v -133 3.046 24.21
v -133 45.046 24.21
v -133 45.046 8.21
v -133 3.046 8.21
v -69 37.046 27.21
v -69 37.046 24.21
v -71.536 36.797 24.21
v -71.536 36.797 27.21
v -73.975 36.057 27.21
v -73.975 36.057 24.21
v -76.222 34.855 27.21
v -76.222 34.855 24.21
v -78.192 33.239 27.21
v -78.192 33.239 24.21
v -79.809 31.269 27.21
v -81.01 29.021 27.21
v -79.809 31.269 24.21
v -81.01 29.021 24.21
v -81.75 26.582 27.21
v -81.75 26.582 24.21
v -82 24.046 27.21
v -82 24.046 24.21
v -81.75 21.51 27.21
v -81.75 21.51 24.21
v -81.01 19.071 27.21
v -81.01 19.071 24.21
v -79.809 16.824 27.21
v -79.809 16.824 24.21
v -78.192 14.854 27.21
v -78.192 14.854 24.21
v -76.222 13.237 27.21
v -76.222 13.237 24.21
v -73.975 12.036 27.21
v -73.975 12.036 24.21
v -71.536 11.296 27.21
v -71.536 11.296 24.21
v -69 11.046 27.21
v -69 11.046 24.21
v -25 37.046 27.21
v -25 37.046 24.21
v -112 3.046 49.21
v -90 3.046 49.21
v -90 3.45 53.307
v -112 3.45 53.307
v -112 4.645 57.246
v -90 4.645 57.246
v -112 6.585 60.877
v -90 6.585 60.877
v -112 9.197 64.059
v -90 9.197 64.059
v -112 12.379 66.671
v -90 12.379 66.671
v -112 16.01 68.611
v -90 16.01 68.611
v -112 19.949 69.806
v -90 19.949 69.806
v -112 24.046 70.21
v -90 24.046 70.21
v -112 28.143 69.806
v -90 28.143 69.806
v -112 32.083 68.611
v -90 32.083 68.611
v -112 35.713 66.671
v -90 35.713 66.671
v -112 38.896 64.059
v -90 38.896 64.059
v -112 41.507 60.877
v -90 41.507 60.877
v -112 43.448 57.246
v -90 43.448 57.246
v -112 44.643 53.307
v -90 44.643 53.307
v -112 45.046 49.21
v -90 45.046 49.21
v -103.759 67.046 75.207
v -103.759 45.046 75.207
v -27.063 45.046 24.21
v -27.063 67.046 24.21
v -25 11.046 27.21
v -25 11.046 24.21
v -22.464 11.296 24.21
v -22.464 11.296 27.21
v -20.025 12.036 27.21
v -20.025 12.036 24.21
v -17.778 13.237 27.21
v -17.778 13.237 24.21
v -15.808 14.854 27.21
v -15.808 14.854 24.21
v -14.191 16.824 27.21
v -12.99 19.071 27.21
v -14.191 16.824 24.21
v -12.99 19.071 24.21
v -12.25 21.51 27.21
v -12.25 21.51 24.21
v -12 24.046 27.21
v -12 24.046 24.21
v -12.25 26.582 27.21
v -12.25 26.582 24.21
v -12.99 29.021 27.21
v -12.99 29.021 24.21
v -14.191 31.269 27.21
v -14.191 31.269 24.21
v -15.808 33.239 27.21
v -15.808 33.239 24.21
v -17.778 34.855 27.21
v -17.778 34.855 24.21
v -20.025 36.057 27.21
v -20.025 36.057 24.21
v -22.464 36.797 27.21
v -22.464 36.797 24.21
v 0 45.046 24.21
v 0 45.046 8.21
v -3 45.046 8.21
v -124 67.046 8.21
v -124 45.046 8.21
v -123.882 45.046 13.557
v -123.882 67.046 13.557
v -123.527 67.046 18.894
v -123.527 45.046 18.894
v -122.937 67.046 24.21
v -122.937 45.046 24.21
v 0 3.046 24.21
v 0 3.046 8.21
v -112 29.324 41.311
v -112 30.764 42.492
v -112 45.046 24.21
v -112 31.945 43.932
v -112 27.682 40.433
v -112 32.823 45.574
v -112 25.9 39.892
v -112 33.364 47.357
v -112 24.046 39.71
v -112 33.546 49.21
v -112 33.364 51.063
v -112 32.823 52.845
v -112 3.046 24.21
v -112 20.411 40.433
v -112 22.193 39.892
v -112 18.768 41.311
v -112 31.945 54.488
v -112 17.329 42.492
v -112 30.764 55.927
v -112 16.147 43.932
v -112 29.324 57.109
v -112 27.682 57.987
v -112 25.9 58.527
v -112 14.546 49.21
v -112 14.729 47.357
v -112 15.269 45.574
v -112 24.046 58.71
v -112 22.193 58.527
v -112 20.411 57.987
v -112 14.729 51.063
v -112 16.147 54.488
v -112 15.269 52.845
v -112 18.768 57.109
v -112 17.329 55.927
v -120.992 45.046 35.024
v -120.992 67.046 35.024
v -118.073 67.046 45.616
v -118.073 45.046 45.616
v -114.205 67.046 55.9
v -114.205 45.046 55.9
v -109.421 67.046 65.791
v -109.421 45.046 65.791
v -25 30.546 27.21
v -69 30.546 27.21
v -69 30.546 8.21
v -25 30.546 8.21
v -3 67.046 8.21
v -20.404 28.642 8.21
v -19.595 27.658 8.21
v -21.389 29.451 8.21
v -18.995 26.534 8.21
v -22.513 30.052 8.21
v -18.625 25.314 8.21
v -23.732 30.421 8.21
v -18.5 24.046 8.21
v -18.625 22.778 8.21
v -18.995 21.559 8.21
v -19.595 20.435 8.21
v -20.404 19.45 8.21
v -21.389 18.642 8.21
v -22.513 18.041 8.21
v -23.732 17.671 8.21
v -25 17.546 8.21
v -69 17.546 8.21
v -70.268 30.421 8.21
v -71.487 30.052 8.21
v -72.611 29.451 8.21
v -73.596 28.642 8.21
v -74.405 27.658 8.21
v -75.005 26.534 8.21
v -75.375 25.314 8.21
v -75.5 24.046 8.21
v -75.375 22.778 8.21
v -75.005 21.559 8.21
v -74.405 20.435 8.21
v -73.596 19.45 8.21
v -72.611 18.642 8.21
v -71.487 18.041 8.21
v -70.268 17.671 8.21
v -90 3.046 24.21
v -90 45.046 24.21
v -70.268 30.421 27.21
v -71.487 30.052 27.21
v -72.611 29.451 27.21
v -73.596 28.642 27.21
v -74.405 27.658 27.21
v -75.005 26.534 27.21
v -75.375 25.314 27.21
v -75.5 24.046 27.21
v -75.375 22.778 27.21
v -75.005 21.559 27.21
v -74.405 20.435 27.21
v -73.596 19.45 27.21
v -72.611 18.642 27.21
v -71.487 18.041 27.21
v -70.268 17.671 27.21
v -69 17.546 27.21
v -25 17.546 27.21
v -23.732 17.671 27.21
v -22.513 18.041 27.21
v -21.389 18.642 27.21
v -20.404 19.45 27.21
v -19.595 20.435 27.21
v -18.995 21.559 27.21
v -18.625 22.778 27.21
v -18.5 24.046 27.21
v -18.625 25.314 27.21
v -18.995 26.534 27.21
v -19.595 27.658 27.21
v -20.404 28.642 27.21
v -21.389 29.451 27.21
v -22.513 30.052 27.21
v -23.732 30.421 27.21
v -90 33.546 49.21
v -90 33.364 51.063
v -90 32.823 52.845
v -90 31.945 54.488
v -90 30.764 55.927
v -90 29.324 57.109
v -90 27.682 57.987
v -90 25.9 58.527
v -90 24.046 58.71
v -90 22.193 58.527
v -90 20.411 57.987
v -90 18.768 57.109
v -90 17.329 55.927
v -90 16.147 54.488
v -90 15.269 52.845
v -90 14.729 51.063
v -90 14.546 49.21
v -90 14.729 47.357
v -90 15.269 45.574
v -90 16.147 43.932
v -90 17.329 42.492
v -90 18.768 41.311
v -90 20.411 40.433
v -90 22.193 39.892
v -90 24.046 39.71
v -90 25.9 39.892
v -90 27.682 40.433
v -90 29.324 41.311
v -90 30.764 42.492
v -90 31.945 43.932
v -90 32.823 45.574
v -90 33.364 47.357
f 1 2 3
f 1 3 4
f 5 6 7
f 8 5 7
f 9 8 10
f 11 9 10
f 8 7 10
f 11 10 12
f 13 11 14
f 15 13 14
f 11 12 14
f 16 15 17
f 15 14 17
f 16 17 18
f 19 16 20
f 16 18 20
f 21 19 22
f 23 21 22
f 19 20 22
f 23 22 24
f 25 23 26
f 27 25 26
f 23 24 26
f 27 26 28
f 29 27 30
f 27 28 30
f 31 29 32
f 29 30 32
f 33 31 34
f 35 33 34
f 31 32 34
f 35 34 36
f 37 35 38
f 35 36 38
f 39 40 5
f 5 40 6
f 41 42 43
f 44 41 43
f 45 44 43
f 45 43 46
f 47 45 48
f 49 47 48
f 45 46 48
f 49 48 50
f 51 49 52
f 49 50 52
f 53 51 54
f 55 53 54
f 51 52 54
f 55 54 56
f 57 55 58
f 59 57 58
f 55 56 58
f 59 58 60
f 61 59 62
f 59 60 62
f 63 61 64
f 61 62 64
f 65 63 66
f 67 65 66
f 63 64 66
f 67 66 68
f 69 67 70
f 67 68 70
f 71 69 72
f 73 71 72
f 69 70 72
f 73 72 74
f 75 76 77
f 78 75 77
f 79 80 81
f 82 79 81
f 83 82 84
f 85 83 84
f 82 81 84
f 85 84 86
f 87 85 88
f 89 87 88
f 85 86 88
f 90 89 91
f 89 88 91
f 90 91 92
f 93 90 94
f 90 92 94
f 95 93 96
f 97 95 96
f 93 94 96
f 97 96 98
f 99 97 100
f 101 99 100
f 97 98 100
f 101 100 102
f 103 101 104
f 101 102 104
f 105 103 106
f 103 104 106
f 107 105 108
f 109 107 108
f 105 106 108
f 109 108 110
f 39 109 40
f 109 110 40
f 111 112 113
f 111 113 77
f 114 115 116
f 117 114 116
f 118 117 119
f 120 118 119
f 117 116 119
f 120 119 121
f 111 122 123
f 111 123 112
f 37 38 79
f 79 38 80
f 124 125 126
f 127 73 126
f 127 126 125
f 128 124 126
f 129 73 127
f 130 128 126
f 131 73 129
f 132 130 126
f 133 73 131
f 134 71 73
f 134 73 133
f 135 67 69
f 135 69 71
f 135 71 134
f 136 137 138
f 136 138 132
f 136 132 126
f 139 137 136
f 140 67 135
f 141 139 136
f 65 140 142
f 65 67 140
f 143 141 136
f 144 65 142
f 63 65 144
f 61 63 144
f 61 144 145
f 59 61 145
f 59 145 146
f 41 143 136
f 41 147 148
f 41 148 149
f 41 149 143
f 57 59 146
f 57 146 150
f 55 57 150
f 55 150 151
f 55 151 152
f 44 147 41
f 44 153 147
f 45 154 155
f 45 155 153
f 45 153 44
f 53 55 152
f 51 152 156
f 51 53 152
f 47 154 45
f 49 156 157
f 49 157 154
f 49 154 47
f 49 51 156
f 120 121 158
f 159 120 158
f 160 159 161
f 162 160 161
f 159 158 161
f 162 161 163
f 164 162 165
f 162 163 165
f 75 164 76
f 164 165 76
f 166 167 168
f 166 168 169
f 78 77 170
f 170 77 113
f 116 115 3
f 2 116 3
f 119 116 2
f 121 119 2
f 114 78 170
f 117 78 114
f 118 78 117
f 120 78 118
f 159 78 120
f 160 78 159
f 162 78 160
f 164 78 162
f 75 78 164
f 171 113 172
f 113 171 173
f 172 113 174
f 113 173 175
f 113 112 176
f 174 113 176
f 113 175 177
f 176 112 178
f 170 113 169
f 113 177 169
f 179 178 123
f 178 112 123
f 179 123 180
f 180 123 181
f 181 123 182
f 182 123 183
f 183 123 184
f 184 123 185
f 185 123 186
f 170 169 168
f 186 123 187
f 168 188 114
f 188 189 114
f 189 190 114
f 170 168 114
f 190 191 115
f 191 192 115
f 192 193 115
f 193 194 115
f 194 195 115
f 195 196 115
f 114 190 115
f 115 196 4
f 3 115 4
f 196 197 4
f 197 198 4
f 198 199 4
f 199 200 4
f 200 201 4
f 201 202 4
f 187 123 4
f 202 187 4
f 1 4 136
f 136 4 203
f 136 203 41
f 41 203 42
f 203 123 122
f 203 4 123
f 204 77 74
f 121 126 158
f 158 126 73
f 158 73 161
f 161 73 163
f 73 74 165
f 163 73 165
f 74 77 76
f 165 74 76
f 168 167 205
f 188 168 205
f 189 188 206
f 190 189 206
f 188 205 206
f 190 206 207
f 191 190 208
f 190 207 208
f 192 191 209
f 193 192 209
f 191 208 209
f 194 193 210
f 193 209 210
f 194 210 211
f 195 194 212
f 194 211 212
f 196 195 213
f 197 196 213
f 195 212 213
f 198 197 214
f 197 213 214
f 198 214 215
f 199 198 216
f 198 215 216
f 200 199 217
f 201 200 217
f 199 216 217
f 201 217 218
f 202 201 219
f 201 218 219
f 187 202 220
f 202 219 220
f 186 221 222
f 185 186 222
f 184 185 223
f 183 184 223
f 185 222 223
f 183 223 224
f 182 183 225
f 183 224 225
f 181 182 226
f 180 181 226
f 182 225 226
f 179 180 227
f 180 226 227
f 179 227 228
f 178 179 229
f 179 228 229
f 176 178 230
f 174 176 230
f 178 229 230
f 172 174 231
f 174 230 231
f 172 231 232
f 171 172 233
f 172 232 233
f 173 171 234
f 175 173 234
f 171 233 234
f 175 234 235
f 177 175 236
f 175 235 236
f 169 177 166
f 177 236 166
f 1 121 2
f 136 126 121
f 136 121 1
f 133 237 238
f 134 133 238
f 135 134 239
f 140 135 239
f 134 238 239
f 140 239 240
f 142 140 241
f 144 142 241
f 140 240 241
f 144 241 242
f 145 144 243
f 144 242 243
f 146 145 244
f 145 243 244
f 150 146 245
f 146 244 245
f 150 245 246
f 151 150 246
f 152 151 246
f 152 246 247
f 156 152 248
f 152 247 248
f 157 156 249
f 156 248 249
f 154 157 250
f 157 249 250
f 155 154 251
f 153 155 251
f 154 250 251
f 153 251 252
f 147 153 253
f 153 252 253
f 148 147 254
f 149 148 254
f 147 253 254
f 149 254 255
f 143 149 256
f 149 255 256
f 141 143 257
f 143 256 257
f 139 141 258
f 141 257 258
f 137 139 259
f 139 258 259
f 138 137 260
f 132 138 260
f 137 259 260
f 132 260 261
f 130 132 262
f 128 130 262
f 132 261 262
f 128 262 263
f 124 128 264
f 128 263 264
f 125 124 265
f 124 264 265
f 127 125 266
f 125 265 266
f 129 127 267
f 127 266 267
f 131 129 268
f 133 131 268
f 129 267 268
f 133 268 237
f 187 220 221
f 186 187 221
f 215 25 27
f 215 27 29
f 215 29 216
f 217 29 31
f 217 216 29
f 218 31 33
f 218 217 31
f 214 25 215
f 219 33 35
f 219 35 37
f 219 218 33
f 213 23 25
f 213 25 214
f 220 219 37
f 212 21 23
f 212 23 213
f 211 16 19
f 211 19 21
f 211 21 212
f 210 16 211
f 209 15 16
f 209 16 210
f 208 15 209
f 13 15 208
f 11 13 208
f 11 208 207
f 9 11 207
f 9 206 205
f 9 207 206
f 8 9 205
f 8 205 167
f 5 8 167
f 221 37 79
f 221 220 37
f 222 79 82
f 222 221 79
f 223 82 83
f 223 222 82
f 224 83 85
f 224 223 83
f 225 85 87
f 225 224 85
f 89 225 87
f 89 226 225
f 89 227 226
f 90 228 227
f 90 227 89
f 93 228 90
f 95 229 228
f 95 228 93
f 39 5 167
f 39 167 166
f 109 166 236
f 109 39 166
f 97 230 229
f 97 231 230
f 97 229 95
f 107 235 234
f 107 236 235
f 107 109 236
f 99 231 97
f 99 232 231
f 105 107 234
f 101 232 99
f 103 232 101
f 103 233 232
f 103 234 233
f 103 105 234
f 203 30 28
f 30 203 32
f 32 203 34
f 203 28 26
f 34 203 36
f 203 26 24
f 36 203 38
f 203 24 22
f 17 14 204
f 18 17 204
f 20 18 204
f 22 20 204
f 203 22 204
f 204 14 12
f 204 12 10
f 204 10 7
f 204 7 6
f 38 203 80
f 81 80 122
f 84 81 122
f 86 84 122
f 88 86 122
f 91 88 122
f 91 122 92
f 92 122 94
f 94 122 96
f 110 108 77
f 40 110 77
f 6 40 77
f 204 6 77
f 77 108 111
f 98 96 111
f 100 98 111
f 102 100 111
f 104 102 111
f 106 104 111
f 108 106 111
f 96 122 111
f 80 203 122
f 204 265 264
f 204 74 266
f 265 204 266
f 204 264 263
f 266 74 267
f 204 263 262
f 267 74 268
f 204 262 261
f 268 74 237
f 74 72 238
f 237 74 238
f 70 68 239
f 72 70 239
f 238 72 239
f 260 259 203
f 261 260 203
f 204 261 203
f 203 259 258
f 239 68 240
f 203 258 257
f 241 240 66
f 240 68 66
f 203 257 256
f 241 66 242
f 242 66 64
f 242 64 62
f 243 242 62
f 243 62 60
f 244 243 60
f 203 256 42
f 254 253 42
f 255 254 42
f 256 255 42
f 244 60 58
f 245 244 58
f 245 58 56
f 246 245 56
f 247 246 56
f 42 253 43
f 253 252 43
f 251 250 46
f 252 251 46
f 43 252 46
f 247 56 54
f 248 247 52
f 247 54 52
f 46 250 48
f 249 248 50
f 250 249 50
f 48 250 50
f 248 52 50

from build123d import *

# Parameters (mm, degrees)
F0_W      = 42
F0_H      = 16
F1_DEPTH  = 90
F3_DEPTH  = 22
F4_W      = 42
F4_H      = 16
F5_DEPTH  = 21
F7_DEPTH  = 3
F8_W      = 44
F8_H      = 13
F9_DEPTH  = 19
F11_DEPTH = 22


with BuildPart() as f1:
    # F0 (on Right) → F1 (new body)
    with BuildSketch(Plane.YZ):
        with Locations((24.0463, 16.209877)):
            Rectangle(F0_W, F0_H)
    extrude(amount=-F1_DEPTH)

    # F2 (on face) → F3 (join)
    with BuildSketch(Plane(origin=(-90, 0, 0), x_dir=(0, -1, 0), z_dir=(-1, 0, 0))):
        with BuildLine():
            Line((-45.0463, 49.209877), (-45.0463, 24.209877))
            Line((-45.0463, 24.209877), (-45.0463, 8.209877))
            Line((-45.0463, 8.209877), (-3.0463, 8.209877))
            Line((-3.0463, 8.209877), (-3.0463, 24.209877))
            Line((-3.0463, 24.209877), (-3.0463, 49.209877))
            Line((-3.0463, 49.209877), (-14.5463, 49.209877))
            ThreePointArc((-14.5463, 49.209877), (-24.0463, 39.709877), (-33.5463, 49.209877))
            Line((-33.5463, 49.209877), (-45.0463, 49.209877))
        make_face()
        with BuildLine():
            ThreePointArc((-3.0463, 49.209877), (-24.0463, 70.209877), (-45.0463, 49.209877))
            Line((-45.0463, 49.209877), (-33.5463, 49.209877))
            ThreePointArc((-33.5463, 49.209877), (-24.0463, 58.709877), (-14.5463, 49.209877))
            Line((-14.5463, 49.209877), (-3.0463, 49.209877))
        make_face()
    extrude(amount=F3_DEPTH)

    # F4 (on face) → F5 (join)
    with BuildSketch(Plane(origin=(-112, 0, 0), x_dir=(0, -1, 0), z_dir=(-1, 0, 0))):
        with Locations((-24.0463, 16.209877)):
            Rectangle(F4_W, F4_H)
    extrude(amount=F5_DEPTH)

    # F6 (on face) → F7 (join)
    with BuildSketch(Plane.XY.offset(24.209877)):
        with BuildLine():
            Line((-69, 11.0463), (-25, 11.0463))
            ThreePointArc((-25, 11.0463), (-12, 24.0463), (-25, 37.0463))
            Line((-25, 37.0463), (-69, 37.0463))
            ThreePointArc((-69, 37.0463), (-82, 24.0463), (-69, 11.0463))
        make_face()
    extrude(amount=F7_DEPTH)

    # F8 (on face) → F9 (cut)
    with BuildSketch(Plane.XY.offset(27.209877)):
        with Locations((-47, 24.0463)):
            Rectangle(F8_W, F8_H)
        with BuildLine():
            Line((-69, 17.5463), (-69, 30.5463))
            ThreePointArc((-69, 30.5463), (-75.5, 24.0463), (-69, 17.5463))
        make_face()
        with BuildLine():
            ThreePointArc((-25, 17.5463), (-18.5, 24.0463), (-25, 30.5463))
            Line((-25, 30.5463), (-25, 17.5463))
        make_face()
    extrude(amount=-F9_DEPTH, mode=Mode.SUBTRACT)

    # F10 (on face) → F11 (join)
    with BuildSketch(Plane(origin=(0, 45.0463, 0), x_dir=(-1, 0, 0), z_dir=(0, 1, 0))):
        with BuildLine():
            ThreePointArc((122.937484, 24.209877), (116.255949, 50.802013), (103.758959, 75.207132))
            Line((103.758959, 75.207132), (27.062827, 24.209877))
            Line((27.062827, 24.209877), (90, 24.209877))
            Line((90, 24.209877), (90, 49.209877))
            Line((90, 49.209877), (112, 49.209877))
            Line((112, 49.209877), (112, 24.209877))
            Line((112, 24.209877), (122.937484, 24.209877))
        make_face()
        with BuildLine():
            ThreePointArc((124, 8.209877), (123.734079, 16.227497), (122.937484, 24.209877))
            Line((122.937484, 24.209877), (112, 24.209877))
            Line((112, 24.209877), (112, 49.209877))
            Line((112, 49.209877), (90, 49.209877))
            Line((90, 49.209877), (90, 24.209877))
            Line((90, 24.209877), (27.062827, 24.209877))
            Line((27.062827, 24.209877), (3, 8.209877))
            Line((3, 8.209877), (124, 8.209877))
        make_face()
    extrude(amount=F11_DEPTH)


solid = f1.part
